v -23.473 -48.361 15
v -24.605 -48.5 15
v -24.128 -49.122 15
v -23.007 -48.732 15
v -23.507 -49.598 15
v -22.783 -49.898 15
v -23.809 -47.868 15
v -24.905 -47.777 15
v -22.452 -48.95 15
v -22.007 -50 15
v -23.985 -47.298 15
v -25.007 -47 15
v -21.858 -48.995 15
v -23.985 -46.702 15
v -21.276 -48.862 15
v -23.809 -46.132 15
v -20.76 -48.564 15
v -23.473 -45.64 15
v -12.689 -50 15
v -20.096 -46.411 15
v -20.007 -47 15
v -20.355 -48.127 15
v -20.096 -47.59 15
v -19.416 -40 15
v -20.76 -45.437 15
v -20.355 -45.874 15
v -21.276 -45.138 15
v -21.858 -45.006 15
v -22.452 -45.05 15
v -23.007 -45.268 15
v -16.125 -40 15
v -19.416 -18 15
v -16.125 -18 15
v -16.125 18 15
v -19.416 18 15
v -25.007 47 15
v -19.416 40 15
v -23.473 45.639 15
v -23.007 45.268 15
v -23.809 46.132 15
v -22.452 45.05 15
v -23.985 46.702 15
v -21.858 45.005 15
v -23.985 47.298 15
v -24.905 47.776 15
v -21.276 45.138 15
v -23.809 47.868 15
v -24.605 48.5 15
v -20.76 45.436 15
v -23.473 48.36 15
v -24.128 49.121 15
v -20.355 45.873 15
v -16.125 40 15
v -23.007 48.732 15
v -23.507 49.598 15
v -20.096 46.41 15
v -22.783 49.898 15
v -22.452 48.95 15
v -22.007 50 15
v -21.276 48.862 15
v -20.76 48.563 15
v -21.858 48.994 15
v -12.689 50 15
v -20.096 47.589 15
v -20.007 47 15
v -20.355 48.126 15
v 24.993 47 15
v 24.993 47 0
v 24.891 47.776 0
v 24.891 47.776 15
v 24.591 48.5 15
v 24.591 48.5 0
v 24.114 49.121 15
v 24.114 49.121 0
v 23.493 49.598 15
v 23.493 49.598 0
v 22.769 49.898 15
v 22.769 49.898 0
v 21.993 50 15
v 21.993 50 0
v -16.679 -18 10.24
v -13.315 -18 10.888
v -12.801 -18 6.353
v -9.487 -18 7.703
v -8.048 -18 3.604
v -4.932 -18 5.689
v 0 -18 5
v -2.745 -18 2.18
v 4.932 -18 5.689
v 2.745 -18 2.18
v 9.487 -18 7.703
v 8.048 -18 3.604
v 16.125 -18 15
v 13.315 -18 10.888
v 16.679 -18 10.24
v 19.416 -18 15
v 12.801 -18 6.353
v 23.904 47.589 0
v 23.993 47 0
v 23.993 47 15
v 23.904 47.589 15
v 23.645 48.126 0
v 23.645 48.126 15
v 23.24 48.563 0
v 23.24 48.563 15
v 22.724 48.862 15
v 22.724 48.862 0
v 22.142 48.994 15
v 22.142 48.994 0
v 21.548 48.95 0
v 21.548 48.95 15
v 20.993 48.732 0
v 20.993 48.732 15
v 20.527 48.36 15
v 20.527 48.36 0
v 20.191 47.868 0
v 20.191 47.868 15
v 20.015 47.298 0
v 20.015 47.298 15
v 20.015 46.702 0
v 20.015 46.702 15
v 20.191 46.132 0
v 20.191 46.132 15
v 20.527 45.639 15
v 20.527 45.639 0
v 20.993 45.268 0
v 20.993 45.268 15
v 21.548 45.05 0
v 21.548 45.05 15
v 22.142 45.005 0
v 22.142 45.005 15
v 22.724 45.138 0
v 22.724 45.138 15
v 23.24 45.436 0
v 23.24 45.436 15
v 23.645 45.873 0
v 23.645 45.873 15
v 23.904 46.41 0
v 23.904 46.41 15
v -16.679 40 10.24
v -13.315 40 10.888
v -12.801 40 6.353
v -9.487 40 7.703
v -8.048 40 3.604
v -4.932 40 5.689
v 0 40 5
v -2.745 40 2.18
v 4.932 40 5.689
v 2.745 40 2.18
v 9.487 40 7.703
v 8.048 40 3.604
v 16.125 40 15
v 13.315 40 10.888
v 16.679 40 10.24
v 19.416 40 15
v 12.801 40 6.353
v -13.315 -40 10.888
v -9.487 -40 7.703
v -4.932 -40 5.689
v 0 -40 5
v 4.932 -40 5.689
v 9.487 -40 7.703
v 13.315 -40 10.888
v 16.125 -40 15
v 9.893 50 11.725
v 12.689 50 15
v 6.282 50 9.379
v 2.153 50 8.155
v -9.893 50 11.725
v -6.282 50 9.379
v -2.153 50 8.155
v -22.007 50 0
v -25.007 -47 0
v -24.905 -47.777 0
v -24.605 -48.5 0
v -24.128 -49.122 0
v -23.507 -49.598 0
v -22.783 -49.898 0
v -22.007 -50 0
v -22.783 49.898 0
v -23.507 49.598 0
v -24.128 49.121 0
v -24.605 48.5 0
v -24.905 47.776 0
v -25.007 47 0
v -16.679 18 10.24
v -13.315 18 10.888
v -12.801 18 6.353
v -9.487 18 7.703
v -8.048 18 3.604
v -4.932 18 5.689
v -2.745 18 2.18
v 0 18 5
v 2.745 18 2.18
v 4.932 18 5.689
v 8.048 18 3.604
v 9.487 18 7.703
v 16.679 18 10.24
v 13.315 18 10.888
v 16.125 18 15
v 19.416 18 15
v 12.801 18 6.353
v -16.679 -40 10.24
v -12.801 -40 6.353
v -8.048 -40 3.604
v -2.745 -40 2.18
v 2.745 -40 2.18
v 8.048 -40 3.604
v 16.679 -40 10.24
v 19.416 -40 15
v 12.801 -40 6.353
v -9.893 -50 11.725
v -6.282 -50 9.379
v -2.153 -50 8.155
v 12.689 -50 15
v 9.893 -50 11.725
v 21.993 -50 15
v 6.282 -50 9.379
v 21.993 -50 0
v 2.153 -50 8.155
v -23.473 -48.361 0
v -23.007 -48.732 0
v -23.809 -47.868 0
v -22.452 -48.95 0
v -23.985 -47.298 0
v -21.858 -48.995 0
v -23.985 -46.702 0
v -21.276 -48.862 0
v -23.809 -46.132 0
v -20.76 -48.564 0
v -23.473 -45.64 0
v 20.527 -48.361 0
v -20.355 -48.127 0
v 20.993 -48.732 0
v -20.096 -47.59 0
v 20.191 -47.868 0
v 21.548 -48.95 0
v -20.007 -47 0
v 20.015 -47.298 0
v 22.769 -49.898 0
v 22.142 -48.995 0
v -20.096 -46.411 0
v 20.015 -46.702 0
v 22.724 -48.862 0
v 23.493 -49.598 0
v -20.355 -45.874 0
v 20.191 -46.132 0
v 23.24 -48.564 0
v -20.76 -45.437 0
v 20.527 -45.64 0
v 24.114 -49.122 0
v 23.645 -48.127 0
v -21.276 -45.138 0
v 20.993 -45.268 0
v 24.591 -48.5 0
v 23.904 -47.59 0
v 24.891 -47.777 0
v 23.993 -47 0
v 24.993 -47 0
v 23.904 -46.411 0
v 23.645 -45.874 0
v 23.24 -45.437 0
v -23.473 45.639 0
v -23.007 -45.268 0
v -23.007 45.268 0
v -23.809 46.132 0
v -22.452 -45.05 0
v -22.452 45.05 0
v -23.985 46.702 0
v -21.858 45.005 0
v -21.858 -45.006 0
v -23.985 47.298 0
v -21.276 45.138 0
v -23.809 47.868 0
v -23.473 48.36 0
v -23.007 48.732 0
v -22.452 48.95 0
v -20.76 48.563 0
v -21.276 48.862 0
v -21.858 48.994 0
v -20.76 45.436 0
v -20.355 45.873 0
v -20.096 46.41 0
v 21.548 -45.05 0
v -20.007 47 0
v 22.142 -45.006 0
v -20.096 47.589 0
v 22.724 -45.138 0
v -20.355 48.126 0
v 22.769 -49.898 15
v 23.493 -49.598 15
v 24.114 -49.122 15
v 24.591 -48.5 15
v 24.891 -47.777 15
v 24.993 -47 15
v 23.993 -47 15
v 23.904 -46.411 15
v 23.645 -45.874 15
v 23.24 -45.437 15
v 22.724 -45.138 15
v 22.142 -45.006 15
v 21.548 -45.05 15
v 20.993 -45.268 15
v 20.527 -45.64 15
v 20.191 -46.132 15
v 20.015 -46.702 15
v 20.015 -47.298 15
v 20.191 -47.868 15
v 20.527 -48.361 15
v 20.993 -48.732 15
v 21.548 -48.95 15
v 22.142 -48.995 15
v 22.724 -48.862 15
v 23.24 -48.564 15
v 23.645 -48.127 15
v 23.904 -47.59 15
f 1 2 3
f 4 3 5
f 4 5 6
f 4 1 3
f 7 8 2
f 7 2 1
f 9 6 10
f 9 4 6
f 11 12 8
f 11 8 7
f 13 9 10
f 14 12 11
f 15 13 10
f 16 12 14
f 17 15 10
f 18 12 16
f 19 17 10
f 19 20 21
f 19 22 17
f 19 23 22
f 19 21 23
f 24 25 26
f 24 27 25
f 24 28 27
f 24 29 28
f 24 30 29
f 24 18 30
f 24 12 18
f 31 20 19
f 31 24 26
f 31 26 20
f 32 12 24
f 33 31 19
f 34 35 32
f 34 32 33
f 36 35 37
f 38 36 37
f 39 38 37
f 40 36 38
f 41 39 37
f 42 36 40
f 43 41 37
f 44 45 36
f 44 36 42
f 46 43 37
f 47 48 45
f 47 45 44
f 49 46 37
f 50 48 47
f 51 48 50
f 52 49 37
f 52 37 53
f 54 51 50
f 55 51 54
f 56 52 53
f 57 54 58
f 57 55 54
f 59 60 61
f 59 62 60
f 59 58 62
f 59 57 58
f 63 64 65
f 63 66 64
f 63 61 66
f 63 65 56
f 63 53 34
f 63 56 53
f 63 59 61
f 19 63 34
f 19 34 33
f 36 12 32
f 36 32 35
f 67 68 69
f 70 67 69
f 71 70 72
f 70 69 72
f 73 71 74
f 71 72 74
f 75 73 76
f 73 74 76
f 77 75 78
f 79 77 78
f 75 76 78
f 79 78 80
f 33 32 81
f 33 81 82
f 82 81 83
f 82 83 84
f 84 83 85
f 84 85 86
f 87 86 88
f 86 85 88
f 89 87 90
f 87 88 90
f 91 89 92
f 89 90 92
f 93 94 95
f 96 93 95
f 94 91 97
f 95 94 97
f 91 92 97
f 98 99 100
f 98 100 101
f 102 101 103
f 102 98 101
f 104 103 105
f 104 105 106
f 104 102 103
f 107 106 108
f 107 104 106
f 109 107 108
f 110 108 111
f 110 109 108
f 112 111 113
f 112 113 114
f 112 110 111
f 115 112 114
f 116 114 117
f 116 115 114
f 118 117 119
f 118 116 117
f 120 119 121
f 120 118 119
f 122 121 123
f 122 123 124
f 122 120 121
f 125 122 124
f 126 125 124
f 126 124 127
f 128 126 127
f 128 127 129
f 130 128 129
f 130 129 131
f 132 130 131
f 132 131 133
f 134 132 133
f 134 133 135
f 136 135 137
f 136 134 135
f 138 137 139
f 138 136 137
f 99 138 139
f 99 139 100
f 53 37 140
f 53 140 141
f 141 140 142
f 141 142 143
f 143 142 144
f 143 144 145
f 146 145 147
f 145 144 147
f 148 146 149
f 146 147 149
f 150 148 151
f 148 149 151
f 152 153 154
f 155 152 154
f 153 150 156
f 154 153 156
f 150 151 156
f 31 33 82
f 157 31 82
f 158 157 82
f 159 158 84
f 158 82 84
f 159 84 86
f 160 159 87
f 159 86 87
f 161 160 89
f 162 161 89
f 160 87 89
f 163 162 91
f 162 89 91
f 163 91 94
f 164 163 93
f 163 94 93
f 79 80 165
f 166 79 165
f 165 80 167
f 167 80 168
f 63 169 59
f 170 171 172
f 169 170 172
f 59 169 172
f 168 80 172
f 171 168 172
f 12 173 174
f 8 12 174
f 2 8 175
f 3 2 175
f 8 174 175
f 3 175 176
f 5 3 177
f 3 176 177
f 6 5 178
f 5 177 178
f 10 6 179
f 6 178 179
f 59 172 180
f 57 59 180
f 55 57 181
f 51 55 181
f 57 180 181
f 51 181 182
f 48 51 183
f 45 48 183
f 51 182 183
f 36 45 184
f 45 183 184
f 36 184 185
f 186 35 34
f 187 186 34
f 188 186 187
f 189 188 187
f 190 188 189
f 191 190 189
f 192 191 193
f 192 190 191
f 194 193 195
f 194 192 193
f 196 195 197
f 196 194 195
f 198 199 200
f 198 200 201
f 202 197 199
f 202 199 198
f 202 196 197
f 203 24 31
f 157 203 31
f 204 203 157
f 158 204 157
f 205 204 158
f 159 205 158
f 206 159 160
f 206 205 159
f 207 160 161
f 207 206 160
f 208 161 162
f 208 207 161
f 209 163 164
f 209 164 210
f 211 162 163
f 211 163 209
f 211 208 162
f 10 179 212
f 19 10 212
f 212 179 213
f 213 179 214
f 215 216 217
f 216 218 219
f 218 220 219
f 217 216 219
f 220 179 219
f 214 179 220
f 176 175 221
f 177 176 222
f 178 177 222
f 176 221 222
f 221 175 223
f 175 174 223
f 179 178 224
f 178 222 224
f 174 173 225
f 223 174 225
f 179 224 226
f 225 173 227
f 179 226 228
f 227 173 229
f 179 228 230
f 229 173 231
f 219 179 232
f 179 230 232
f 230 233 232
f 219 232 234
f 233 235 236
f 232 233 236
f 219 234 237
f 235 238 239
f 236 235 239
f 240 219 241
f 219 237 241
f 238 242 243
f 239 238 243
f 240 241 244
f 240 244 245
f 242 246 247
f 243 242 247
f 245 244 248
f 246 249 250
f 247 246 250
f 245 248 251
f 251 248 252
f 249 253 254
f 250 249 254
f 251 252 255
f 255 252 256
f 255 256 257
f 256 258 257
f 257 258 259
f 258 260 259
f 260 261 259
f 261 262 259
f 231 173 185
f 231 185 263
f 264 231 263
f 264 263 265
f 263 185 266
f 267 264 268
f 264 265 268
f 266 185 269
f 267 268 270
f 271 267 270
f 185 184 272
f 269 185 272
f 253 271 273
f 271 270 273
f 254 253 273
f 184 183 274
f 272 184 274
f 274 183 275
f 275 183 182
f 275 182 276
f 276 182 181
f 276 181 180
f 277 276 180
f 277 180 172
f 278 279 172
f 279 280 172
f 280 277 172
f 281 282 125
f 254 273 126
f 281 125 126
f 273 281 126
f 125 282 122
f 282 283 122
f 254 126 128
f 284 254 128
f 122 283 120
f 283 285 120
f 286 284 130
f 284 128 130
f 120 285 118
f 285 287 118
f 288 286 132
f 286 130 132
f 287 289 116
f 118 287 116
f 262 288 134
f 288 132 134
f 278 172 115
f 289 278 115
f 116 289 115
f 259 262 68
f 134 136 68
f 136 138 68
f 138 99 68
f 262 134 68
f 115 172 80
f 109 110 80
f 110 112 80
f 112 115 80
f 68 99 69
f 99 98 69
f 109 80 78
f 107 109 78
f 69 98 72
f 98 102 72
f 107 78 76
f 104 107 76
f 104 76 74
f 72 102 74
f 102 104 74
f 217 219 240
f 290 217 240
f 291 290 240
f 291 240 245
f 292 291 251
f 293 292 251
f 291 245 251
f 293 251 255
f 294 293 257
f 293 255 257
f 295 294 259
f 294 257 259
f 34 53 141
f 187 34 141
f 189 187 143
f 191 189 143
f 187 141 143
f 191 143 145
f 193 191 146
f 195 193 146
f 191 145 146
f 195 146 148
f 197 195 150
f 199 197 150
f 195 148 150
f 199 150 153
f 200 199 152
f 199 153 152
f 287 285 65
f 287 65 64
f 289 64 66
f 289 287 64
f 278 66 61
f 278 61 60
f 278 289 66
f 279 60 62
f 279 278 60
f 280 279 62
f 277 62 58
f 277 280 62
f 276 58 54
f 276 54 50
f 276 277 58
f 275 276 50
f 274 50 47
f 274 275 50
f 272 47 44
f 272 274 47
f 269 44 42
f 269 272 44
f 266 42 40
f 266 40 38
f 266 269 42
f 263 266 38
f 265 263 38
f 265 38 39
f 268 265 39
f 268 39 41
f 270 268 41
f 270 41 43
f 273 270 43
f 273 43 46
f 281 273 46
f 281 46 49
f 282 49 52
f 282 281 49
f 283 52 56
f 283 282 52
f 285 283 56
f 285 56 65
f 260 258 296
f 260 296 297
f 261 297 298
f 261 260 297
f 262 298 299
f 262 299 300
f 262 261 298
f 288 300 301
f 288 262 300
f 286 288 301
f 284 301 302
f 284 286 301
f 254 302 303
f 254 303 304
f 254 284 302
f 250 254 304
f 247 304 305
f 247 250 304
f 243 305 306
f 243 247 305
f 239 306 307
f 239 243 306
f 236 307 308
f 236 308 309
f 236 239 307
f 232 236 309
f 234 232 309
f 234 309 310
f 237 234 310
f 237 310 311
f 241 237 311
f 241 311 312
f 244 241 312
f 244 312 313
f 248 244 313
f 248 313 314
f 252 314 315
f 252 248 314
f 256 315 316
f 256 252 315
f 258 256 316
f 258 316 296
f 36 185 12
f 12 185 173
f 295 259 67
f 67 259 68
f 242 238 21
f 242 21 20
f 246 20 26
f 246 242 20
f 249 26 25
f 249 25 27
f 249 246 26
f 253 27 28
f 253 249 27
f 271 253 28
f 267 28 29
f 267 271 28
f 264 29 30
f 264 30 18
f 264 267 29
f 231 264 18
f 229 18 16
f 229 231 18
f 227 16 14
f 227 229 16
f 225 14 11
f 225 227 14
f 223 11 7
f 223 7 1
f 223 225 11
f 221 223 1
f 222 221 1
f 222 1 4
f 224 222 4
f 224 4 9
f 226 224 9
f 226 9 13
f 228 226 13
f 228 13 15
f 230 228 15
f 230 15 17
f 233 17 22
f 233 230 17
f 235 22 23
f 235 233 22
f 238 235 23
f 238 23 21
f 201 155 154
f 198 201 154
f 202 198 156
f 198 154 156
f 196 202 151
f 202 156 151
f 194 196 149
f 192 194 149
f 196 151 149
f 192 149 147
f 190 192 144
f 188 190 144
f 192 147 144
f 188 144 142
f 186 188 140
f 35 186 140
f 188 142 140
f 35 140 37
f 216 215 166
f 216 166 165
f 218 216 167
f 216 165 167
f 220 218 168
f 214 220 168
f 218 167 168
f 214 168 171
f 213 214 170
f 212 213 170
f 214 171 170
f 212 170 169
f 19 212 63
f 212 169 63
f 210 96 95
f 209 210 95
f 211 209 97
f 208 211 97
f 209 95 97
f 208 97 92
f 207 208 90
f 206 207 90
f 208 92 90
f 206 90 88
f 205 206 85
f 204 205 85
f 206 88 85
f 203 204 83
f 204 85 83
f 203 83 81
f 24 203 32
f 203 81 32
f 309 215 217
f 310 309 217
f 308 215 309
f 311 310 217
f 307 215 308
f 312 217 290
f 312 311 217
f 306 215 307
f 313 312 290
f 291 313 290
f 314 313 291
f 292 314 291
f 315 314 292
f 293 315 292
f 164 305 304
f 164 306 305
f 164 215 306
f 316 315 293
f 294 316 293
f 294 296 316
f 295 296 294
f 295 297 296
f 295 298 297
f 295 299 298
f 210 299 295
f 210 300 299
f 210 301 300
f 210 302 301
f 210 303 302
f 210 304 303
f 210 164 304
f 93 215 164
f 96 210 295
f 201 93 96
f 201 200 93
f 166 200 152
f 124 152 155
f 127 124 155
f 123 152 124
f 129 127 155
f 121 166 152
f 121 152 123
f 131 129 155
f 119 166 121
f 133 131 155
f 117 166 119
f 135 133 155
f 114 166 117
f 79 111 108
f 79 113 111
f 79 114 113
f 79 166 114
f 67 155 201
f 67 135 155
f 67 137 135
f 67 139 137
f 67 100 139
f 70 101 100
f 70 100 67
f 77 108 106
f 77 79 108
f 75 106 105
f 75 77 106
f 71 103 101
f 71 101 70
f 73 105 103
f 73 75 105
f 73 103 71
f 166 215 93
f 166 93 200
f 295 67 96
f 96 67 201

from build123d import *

# Parameters (mm, degrees)
SKETCH1_R           = 2
BOSS_EXTRUDE1_DEPTH = 15
CUT_EXTRUDE1_DEPTH  = 105.165020701
CUT_EXTRUDE2_START  = -10
CUT_EXTRUDE2_DEPTH  = 22
CUT_EXTRUDE3_START  = -68
CUT_EXTRUDE3_DEPTH  = 22


with BuildPart() as part:
    # Sketch1 → Boss-Extrude1 (new body)
    with BuildSketch(Plane.XY):
        with BuildLine():
            Line((-22.007029764, -50.000223574), (21.992970236, -50.000223574))
            ThreePointArc((21.992970236, -50.000223574), (24.114290579, -49.121543918), (24.992970236, -47.000223574))
            Line((24.992970236, -47.000223574), (24.992970236, 46.999776426))
            ThreePointArc((24.992970236, 46.999776426), (24.114290579, 49.12109677), (21.992970236, 49.999776426))
            Line((21.992970236, 49.999776426), (-22.007029764, 49.999776426))
            ThreePointArc((-22.007029764, 49.999776426), (-24.128350108, 49.12109677), (-25.007029764, 46.999776426))
            Line((-25.007029764, 46.999776426), (-25.007029764, -47.000223574))
            ThreePointArc((-25.007029764, -47.000223574), (-24.128350108, -49.121543918), (-22.007029764, -50.000223574))
        make_face()
        with Locations((-22.007029764, 46.999776426)):
            Circle(SKETCH1_R, mode=Mode.SUBTRACT)
        with Locations((21.992970236, 46.999776426)):
            Circle(SKETCH1_R, mode=Mode.SUBTRACT)
        with Locations((21.992970236, -47.000223574)):
            Circle(SKETCH1_R, mode=Mode.SUBTRACT)
        with Locations((-22.007029764, -47.000223574)):
            Circle(SKETCH1_R, mode=Mode.SUBTRACT)
    extrude(amount=BOSS_EXTRUDE1_DEPTH)

    # Sketch2 → Cut-Extrude1 (cut, through all)
    with BuildSketch(Plane(origin=(0, 49.999776426, 0), x_dir=(1, 0, 0), z_dir=(0, 1, 0))):
        with BuildLine():
            ThreePointArc((12.68857754, -15), (0, -8), (-12.68857754, -15))
            Line((-12.68857754, -15), (12.68857754, -15))
        make_face()
    extrude(amount=-CUT_EXTRUDE1_DEPTH, mode=Mode.SUBTRACT)

    # Sketch2<4> → Cut-Extrude2 (cut)
    with BuildSketch(Plane(origin=(0, 49.999776426, 0), x_dir=(1, 0, 0), z_dir=(0, 1, 0)).offset(CUT_EXTRUDE2_START)):
        with BuildLine():
            ThreePointArc((19.416487839, -15), (0, -2), (-19.416487839, -15))
            Line((-19.416487839, -15), (-16.124515497, -15))
            ThreePointArc((-16.124515497, -15), (0, -5), (16.124515497, -15))
            Line((16.124515497, -15), (19.416487839, -15))
        make_face()
    extrude(amount=-CUT_EXTRUDE2_DEPTH, mode=Mode.SUBTRACT)

    # Sketch2<5> → Cut-Extrude3 (cut)
    with BuildSketch(Plane(origin=(0, 49.999776426, 0), x_dir=(1, 0, 0), z_dir=(0, 1, 0)).offset(CUT_EXTRUDE3_START)):
        with BuildLine():
            ThreePointArc((19.416487839, -15), (0, -2), (-19.416487839, -15))
            Line((-19.416487839, -15), (-16.124515497, -15))
            ThreePointArc((-16.124515497, -15), (0, -5), (16.124515497, -15))
            Line((16.124515497, -15), (19.416487839, -15))
        make_face()
    extrude(amount=-CUT_EXTRUDE3_DEPTH, mode=Mode.SUBTRACT)


solid = part.part
